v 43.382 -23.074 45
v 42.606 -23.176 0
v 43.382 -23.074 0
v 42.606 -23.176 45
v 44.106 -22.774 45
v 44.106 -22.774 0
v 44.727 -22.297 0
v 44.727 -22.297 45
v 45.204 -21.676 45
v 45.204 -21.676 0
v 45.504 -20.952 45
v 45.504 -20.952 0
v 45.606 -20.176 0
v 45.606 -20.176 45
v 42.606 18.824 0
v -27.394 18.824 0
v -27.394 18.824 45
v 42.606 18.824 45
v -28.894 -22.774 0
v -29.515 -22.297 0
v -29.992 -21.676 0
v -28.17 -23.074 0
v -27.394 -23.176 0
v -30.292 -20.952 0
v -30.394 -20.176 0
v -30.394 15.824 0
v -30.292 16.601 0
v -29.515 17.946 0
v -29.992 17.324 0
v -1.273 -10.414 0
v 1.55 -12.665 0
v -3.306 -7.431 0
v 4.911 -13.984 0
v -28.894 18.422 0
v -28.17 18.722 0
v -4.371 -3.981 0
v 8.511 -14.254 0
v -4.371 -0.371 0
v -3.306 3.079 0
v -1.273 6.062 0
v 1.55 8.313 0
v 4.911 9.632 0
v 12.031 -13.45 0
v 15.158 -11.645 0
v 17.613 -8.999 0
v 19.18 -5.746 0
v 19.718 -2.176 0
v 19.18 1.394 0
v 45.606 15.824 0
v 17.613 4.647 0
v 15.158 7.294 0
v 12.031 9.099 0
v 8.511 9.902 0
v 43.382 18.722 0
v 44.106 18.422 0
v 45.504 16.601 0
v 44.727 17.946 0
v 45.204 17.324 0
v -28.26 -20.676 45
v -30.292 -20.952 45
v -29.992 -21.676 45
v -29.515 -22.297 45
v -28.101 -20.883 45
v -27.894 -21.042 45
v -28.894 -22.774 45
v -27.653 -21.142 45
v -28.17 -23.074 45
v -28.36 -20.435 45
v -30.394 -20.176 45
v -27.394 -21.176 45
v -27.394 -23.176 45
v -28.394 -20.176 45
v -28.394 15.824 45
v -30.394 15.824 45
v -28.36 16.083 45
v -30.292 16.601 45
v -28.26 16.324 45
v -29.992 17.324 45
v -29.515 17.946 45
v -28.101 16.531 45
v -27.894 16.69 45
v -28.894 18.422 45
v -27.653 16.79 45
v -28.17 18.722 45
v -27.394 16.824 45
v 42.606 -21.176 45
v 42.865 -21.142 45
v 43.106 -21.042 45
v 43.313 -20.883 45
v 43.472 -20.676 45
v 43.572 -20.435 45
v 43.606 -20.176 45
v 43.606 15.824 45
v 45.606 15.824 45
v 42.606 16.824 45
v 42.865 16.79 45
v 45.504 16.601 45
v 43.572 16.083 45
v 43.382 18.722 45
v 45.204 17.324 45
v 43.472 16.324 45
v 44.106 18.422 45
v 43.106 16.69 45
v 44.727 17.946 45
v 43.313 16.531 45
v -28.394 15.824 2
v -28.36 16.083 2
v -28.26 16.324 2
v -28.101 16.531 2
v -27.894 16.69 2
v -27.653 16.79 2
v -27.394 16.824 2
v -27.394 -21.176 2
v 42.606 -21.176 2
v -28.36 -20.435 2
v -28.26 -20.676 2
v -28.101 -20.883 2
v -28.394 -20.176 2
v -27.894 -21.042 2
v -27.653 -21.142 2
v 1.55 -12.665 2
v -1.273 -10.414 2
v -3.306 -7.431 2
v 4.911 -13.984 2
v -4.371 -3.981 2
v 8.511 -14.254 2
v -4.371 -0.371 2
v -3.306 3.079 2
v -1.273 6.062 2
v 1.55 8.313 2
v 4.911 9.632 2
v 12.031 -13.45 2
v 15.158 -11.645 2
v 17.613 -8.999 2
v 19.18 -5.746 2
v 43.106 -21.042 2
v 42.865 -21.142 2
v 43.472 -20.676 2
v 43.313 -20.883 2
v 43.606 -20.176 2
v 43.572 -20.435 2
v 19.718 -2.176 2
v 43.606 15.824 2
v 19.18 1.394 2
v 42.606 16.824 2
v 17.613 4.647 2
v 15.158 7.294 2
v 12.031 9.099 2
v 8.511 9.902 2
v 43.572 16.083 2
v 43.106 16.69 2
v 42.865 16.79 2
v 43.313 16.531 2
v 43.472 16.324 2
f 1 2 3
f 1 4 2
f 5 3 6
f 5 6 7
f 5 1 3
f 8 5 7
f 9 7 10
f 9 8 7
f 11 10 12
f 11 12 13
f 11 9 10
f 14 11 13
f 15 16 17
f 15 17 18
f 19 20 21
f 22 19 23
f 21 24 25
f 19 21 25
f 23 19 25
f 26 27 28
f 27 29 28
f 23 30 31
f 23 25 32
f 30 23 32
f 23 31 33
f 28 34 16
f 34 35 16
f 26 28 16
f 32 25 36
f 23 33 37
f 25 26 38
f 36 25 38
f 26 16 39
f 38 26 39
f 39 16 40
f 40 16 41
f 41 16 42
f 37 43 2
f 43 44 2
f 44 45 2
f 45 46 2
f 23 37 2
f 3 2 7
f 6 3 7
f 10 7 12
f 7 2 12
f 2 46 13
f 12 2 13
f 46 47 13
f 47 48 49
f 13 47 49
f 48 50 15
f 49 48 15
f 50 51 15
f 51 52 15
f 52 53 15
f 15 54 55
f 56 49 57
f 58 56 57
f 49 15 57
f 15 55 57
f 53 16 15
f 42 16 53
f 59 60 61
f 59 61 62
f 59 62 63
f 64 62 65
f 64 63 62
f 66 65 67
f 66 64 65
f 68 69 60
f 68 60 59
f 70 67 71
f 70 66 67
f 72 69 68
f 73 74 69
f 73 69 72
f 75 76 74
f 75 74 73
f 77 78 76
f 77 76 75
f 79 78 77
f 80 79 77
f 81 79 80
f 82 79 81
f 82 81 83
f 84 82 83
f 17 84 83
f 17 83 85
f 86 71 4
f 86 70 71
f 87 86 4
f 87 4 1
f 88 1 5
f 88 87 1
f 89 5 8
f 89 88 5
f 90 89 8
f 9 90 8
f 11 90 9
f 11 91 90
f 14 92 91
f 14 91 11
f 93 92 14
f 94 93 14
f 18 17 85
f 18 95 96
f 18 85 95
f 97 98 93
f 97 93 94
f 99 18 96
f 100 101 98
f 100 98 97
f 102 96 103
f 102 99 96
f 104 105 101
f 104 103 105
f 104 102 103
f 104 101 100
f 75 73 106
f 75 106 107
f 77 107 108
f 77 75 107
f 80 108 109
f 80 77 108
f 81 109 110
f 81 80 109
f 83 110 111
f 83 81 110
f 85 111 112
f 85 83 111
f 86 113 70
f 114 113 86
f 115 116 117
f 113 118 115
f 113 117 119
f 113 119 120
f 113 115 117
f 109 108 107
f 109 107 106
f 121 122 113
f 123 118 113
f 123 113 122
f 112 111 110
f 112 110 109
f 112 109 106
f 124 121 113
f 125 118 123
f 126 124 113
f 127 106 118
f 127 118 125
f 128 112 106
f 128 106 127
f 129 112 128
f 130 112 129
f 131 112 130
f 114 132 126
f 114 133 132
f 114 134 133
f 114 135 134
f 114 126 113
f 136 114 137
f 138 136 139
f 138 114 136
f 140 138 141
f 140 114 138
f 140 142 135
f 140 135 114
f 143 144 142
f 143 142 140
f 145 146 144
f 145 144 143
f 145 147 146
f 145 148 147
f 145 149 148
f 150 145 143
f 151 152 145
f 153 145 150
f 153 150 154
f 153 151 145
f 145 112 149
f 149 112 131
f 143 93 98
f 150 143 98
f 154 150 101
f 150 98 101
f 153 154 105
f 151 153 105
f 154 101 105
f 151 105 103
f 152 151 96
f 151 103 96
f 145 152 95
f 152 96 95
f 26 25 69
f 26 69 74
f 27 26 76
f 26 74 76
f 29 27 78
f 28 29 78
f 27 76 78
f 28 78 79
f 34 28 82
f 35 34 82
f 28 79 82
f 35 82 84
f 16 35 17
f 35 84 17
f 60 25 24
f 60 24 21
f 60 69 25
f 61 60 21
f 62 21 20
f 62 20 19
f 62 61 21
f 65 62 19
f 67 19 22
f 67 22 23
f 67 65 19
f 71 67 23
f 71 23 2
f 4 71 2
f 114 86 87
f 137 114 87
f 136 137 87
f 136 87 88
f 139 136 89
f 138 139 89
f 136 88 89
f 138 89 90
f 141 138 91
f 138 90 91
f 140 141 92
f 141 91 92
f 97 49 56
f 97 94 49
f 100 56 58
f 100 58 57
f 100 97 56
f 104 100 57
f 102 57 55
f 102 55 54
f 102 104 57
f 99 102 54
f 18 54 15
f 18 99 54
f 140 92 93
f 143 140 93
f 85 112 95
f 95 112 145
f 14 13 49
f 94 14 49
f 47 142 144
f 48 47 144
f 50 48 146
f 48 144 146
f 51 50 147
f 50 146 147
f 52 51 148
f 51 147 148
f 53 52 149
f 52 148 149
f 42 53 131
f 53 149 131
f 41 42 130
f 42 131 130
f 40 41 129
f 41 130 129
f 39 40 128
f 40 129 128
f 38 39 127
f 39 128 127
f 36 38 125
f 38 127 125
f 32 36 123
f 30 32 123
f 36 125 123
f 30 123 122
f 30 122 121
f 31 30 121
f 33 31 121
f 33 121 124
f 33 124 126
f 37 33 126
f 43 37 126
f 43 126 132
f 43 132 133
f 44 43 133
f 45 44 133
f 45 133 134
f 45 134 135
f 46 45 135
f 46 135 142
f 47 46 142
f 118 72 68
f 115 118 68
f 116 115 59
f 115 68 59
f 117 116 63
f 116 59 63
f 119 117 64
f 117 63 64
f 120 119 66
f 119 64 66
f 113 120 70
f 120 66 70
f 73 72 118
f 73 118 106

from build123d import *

# Parameters (mm, degrees)
F0_W     = 76
F0_H     = 42
F1_DEPTH = 45
F2_R     = 3
F3_T     = -2
F4_R     = 12.11184
F5_DEPTH = 25


with BuildPart() as f1:
    # F0 (on Top) → F1 (new body)
    with BuildSketch(Plane.XY):
        with Locations((7.606018, -2.175814)):
            Rectangle(F0_W, F0_H)
    extrude(amount=F1_DEPTH)

    # F2
    f2_edges = [f1.edges().sort_by_distance(p)[0] for p in [
        (-30.393982, -23.175814, 22.5),
        (-30.393982, 18.824186, 22.5),
        (45.606018, -23.175814, 22.5),
        (45.606018, 18.824186, 22.5),
    ]]
    fillet(f2_edges, radius=F2_R)

    # F3
    f3_openings = [f1.faces().sort_by_distance(p)[0] for p in [
        (7.606018, -2.175814, 45),
    ]]
    offset(amount=F3_T, openings=f3_openings)

    # F4 (on face) → F5 (cut)
    with BuildSketch(Plane.XY.offset(2)):
        with Locations((7.606018, -2.175814)):
            Circle(F4_R)
    extrude(amount=-F5_DEPTH, mode=Mode.SUBTRACT)


solid = f1.part
